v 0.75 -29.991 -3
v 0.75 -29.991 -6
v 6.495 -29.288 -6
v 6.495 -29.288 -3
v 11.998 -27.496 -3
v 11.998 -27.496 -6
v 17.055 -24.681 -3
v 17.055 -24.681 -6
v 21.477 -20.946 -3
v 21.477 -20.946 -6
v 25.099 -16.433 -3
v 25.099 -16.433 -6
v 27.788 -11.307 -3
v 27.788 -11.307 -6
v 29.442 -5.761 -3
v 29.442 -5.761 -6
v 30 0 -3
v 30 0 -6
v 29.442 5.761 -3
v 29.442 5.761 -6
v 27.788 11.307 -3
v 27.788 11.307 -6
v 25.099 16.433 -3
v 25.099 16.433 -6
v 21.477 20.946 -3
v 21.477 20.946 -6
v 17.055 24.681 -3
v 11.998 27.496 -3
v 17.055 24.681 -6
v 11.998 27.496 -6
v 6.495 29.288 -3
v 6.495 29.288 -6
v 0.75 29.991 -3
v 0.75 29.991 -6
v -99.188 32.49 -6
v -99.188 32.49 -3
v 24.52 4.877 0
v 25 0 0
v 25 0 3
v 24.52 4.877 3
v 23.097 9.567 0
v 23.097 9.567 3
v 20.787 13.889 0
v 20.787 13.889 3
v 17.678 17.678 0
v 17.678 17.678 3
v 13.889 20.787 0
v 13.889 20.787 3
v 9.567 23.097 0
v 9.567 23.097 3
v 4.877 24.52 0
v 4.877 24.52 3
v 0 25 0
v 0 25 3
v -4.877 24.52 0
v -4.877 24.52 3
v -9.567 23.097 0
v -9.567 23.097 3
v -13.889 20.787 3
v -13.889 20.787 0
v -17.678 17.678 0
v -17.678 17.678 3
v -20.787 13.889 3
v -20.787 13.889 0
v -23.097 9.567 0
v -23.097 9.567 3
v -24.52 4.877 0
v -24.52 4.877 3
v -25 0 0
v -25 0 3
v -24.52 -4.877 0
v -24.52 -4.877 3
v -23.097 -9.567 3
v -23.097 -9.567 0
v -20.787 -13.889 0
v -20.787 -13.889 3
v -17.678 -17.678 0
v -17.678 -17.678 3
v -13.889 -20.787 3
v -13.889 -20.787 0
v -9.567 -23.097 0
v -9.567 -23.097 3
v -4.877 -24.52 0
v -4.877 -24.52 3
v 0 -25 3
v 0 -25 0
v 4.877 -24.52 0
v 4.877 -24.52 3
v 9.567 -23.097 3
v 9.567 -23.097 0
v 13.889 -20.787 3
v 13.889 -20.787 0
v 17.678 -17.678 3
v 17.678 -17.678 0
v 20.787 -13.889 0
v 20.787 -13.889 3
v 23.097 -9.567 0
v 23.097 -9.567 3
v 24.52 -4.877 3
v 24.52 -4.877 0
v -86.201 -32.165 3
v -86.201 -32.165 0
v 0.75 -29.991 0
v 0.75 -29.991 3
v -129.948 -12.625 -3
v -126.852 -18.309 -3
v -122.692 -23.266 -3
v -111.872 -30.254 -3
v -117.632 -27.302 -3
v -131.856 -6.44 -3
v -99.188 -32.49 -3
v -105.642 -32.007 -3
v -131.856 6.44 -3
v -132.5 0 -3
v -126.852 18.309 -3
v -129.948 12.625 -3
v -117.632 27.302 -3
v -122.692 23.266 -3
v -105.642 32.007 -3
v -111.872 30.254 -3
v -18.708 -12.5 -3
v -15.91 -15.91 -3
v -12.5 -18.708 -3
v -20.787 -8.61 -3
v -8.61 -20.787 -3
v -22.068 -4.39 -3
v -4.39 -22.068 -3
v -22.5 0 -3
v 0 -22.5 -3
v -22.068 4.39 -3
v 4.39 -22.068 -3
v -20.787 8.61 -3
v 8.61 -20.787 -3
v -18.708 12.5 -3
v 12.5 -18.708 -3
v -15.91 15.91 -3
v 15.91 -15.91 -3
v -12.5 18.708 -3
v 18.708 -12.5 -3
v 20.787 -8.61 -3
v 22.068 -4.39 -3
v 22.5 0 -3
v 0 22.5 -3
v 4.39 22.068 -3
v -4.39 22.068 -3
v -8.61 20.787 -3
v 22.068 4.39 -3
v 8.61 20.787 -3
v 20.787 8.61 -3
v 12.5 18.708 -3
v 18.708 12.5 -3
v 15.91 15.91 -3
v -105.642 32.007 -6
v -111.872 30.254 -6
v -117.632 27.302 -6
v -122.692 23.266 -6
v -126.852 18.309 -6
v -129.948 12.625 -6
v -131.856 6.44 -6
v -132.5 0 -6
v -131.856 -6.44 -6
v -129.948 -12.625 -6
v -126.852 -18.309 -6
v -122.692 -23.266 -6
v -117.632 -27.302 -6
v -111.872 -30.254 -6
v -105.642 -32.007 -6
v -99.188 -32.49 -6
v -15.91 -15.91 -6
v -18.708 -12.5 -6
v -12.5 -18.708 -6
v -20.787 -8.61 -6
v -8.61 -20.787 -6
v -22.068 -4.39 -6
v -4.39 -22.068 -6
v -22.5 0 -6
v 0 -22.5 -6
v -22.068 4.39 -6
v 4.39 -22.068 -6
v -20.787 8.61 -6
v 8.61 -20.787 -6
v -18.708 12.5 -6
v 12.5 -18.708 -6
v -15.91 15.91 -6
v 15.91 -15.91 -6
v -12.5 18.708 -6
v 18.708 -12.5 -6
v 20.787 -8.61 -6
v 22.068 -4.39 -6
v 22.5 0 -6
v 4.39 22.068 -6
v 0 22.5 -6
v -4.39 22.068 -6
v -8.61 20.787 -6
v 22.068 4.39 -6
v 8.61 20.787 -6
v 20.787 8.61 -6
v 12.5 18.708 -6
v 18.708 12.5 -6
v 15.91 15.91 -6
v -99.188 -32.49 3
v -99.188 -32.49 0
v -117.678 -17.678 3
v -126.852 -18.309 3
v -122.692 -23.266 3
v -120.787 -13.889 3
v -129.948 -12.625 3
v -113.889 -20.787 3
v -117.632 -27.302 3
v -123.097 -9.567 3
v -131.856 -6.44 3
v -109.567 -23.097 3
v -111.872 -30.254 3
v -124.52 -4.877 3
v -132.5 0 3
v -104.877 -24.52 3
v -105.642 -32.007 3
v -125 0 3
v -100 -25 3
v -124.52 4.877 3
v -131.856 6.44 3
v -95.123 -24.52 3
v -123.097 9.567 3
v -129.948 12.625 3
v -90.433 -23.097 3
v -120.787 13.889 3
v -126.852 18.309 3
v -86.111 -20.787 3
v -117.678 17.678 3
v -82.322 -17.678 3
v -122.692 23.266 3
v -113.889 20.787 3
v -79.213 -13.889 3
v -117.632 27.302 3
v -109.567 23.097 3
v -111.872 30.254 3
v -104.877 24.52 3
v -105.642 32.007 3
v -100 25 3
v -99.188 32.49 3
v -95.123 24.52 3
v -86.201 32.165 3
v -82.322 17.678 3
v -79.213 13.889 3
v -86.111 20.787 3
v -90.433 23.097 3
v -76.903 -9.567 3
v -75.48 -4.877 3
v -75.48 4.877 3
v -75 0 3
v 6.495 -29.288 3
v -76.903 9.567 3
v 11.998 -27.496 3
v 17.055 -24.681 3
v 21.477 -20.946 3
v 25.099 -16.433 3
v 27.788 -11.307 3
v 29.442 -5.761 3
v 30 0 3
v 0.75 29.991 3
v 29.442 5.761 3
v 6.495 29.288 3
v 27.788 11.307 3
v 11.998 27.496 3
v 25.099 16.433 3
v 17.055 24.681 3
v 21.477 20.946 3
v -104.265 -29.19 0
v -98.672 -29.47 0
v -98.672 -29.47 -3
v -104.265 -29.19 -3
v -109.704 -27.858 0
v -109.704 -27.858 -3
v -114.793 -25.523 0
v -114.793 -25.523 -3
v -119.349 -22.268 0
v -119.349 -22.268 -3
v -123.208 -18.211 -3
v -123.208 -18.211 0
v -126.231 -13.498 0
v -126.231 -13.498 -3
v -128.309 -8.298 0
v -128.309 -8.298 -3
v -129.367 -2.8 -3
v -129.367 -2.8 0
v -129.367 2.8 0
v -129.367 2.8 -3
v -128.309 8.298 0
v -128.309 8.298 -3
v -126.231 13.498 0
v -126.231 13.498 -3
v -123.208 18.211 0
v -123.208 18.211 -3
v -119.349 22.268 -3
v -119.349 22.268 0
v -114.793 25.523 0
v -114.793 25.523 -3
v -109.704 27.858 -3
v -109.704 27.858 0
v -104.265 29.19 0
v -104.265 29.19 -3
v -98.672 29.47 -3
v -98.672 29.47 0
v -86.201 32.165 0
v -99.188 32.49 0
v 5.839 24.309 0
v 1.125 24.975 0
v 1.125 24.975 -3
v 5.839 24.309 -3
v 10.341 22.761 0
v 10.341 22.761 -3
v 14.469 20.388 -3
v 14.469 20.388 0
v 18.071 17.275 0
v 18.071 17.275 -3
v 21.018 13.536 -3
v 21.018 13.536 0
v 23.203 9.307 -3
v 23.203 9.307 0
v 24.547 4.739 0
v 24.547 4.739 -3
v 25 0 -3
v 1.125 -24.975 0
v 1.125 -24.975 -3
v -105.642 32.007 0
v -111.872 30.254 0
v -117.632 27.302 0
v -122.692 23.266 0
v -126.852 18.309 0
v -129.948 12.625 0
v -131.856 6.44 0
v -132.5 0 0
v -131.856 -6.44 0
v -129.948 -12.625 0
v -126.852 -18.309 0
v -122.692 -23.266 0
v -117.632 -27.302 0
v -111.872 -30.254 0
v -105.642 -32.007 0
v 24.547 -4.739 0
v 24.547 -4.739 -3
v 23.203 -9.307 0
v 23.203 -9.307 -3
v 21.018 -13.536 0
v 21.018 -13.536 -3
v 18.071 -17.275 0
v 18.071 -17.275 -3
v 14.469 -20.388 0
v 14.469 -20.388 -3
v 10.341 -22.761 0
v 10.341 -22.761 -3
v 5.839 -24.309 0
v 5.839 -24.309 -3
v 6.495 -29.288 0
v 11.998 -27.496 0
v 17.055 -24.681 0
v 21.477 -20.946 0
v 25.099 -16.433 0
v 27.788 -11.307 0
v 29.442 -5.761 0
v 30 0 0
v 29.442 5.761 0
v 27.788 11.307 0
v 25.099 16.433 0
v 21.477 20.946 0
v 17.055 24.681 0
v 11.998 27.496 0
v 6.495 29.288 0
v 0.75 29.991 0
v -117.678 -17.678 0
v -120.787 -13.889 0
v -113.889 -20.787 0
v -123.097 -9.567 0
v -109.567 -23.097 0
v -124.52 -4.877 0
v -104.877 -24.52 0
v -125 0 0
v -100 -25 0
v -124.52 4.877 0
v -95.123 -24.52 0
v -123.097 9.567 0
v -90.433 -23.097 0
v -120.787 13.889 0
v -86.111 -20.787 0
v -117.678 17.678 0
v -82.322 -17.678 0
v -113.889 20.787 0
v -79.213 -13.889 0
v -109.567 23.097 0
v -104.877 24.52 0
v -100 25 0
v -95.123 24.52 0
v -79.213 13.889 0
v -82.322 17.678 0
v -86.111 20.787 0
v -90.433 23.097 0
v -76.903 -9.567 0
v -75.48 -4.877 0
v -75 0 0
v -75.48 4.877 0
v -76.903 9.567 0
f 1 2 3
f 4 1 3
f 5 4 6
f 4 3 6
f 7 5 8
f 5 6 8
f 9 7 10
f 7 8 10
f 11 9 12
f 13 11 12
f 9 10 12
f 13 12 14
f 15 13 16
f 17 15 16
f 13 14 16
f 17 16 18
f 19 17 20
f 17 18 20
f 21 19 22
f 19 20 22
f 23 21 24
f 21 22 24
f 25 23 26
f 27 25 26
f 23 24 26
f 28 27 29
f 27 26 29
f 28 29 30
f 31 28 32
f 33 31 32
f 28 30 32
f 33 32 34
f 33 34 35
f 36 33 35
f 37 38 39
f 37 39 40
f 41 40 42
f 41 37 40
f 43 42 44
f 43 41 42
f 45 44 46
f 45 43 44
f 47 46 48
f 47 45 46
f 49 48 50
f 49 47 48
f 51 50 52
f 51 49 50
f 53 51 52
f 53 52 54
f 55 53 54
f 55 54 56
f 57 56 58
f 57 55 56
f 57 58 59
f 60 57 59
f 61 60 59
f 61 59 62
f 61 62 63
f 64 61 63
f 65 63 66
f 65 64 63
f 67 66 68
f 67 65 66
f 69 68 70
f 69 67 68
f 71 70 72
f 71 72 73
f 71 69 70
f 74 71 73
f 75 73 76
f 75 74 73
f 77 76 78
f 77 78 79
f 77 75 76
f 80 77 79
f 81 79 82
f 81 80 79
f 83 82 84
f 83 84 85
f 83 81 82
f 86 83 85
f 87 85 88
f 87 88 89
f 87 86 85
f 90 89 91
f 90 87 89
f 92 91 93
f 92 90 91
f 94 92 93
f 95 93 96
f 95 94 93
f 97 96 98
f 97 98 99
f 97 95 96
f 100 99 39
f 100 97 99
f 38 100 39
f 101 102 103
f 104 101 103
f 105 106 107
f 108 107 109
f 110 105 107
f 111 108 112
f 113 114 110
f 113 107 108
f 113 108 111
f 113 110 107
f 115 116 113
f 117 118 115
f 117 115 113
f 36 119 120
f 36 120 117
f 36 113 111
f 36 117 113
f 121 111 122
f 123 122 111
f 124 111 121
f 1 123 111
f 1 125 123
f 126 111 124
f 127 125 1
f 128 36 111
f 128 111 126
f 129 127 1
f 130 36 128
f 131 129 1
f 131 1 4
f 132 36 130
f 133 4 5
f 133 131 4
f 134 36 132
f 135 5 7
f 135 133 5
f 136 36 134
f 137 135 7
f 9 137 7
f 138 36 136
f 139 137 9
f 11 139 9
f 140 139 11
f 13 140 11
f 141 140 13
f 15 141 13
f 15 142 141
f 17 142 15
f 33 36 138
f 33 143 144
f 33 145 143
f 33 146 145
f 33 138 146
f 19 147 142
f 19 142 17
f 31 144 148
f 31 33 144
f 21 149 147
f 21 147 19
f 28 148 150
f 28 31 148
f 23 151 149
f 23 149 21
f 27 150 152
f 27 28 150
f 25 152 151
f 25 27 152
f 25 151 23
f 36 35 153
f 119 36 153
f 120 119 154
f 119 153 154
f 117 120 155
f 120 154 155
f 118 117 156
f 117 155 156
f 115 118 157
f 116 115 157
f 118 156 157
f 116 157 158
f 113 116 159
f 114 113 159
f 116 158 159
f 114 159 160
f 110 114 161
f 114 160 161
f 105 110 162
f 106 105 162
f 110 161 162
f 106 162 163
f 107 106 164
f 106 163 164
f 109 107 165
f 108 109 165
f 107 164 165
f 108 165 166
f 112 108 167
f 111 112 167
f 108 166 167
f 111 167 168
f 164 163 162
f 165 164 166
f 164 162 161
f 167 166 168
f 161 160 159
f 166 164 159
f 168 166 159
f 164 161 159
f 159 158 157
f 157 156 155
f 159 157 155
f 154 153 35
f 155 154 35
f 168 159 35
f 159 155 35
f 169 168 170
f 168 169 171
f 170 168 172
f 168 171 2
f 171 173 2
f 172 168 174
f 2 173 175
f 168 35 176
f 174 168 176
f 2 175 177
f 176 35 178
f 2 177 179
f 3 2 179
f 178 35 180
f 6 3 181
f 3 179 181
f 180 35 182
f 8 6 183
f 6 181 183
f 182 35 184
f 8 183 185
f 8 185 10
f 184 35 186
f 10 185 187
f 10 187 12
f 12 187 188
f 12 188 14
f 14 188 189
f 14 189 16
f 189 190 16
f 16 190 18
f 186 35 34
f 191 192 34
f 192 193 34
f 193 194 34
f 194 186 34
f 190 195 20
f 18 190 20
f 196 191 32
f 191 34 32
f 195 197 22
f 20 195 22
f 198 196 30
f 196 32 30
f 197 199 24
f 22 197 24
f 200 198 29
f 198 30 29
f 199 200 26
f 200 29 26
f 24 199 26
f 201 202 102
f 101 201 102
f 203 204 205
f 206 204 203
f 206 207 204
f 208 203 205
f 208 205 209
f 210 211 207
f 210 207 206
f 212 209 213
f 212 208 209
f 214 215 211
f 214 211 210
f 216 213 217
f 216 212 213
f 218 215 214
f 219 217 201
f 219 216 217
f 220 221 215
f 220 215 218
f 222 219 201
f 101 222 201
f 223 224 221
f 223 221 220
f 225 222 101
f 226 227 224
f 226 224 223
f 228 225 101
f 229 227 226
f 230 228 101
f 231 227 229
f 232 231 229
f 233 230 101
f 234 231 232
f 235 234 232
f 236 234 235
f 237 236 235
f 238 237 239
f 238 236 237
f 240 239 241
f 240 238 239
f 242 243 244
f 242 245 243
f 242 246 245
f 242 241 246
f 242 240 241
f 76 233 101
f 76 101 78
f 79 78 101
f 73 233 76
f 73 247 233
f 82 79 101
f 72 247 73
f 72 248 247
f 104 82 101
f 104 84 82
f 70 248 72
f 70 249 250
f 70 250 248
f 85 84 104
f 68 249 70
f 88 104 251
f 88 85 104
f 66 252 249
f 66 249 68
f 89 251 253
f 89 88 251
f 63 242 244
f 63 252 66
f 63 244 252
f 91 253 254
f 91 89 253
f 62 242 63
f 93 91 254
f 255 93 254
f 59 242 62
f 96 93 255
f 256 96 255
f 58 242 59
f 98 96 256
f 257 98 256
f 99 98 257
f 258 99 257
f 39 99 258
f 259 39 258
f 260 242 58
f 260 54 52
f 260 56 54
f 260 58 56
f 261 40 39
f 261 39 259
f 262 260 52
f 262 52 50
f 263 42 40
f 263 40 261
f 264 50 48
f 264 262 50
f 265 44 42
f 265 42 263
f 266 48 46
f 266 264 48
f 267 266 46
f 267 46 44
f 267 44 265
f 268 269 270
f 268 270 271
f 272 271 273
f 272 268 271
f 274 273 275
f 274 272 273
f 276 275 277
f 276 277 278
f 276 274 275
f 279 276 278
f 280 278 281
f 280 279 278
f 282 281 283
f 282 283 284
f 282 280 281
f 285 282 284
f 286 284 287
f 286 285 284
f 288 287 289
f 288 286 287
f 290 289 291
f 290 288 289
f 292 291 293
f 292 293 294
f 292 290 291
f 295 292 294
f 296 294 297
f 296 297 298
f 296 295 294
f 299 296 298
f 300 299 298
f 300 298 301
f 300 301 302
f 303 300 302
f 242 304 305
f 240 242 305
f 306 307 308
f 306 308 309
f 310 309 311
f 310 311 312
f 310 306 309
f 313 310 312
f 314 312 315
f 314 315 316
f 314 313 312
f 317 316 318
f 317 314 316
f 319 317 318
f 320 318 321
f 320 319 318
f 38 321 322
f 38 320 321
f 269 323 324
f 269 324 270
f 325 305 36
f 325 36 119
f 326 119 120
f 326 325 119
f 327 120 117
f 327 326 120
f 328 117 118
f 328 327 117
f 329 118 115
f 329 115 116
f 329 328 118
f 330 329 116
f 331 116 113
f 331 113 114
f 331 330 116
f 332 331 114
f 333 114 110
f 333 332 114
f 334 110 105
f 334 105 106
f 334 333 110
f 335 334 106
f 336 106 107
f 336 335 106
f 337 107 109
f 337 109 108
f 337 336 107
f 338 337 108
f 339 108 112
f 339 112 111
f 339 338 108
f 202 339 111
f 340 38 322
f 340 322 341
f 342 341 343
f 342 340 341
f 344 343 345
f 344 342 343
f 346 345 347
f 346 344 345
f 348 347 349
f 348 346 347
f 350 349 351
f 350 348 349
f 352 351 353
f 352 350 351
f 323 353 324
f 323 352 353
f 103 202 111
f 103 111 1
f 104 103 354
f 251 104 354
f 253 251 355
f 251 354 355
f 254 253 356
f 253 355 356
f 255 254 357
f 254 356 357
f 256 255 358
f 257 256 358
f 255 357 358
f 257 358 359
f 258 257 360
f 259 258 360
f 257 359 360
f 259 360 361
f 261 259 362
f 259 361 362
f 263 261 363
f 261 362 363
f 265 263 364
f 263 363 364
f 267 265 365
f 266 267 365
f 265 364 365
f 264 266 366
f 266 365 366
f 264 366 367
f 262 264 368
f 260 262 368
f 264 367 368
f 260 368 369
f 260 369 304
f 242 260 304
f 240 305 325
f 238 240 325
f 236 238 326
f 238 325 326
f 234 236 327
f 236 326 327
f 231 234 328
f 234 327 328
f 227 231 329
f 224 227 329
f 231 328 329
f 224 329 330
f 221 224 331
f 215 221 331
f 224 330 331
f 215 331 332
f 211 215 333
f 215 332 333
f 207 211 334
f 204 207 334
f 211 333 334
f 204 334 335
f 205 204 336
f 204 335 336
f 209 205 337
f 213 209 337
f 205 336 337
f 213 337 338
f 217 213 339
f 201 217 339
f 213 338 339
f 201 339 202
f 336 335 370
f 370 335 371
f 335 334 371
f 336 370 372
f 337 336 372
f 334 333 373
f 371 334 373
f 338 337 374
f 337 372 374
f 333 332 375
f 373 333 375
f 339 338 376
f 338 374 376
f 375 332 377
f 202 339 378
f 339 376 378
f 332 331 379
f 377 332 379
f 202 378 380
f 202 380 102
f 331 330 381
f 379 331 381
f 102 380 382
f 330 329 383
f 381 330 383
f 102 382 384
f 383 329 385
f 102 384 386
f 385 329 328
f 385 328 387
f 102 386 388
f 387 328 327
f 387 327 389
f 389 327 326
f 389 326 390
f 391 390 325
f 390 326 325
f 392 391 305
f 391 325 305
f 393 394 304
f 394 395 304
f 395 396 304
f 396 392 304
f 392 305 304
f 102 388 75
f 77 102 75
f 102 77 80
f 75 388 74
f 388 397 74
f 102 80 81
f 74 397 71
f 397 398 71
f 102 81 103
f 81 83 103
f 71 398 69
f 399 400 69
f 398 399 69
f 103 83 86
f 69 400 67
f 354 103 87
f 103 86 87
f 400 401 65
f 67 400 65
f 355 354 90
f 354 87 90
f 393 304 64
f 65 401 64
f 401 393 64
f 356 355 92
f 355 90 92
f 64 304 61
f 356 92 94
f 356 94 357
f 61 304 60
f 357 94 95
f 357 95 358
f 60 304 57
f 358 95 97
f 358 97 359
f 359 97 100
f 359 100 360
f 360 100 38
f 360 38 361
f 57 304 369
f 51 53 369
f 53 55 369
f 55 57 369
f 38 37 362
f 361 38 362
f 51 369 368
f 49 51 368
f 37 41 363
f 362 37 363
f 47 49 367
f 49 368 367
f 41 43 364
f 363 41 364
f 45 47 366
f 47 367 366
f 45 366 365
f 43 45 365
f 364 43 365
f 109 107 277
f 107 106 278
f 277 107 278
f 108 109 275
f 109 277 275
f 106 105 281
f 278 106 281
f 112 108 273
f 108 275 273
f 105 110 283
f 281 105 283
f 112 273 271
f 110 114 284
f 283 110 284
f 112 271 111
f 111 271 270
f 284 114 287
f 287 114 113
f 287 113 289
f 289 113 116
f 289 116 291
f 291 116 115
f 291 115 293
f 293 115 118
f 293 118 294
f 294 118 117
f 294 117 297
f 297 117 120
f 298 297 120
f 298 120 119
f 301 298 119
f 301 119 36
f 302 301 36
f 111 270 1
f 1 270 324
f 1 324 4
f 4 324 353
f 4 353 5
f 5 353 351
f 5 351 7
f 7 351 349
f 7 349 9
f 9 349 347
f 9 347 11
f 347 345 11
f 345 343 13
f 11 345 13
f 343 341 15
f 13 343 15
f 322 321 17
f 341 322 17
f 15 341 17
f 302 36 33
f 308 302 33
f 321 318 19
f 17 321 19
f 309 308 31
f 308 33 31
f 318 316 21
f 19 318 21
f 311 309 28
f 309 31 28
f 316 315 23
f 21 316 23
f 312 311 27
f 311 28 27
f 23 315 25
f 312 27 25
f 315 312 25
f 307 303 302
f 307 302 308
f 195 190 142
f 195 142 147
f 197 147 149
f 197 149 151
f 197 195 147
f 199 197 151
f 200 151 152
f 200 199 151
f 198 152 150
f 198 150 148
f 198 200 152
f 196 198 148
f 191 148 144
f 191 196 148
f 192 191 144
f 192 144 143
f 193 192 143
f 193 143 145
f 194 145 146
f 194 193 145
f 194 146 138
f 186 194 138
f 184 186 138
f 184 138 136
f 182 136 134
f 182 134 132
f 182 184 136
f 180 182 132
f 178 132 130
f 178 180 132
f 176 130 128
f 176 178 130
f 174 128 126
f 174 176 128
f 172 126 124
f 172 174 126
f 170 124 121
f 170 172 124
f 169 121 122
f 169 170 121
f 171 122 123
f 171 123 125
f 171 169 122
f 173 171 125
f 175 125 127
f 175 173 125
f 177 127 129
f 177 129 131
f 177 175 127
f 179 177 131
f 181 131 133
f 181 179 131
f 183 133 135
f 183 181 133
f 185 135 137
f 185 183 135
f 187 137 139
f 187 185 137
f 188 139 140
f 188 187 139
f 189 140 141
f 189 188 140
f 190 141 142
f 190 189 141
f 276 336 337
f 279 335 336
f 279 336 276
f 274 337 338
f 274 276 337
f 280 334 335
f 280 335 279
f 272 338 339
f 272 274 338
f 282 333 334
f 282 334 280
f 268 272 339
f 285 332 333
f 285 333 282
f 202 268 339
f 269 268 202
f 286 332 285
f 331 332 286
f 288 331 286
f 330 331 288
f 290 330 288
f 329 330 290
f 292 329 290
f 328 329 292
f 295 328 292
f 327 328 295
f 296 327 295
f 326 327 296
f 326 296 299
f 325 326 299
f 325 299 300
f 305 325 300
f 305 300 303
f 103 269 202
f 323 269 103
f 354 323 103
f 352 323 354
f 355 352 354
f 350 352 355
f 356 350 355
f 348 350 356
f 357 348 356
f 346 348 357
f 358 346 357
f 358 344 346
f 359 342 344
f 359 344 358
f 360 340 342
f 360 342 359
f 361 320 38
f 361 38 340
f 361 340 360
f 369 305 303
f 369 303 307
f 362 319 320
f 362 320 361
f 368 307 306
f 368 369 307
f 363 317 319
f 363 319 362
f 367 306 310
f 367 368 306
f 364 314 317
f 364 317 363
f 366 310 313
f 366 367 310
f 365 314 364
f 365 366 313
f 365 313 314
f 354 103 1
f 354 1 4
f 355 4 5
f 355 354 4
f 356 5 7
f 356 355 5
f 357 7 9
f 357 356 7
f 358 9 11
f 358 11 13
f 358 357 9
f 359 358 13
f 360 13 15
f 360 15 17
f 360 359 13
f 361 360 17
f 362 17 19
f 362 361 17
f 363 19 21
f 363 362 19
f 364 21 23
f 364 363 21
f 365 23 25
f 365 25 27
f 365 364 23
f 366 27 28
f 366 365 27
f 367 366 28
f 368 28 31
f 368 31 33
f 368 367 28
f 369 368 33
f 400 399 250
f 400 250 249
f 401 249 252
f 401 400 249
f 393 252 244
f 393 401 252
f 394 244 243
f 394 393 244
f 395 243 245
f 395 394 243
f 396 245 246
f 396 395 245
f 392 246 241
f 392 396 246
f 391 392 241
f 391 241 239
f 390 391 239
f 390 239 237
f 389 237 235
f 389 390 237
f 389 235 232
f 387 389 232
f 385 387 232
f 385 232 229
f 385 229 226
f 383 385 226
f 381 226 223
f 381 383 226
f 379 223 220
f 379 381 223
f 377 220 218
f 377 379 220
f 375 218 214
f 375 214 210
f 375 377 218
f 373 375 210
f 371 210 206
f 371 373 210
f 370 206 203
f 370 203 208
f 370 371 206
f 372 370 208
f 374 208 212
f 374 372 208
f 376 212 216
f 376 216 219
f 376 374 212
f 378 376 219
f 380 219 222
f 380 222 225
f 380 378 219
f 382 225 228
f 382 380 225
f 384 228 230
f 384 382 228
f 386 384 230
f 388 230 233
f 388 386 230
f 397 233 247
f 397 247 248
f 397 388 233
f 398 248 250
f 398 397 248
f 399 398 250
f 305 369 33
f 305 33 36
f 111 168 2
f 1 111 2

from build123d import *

# Parameters (mm, degrees)
F1_R     = 25
F5_DEPTH = 3
F6_DEPTH = 3
F4_R     = 22.5
F7_DEPTH = 3


with BuildPart() as f5:
    # F1 (on Top) → F5 (new body)
    with BuildSketch(Plane.XY):
        with BuildLine():
            Line((0.75, 29.9906235347), (-86.2011790718, 32.1650826362))
            Line((-86.2011790718, 32.1650826362), (-99.1875, 32.4898421626))
            ThreePointArc((-99.1875, 32.4898421626), (-132.5, 0), (-99.1875, -32.4898421626))
            Line((-99.1875, -32.4898421626), (-86.2011790718, -32.1650826362))
            Line((-86.2011790718, -32.1650826362), (0.75, -29.9906235347))
            ThreePointArc((0.75, -29.9906235347), (30, 0), (0.75, 29.9906235347))
        make_face()
        with Locations((-100, 0)):
            Circle(F1_R, mode=Mode.SUBTRACT)
        Circle(F1_R, mode=Mode.SUBTRACT)
    extrude(amount=F5_DEPTH)


with BuildPart() as f6:
    # F2 (on Top) → F6 (new body)
    with BuildSketch(Plane.XY):
        with BuildLine():
            Line((0.75, 29.9906235347), (-99.1875, 32.4898421626))
            ThreePointArc((-99.1875, 32.4898421626), (-132.5, 0), (-99.1875, -32.4898421626))
            Line((-99.1875, -32.4898421626), (0.75, -29.9906235347))
            ThreePointArc((0.75, -29.9906235347), (30, 0), (0.75, 29.9906235347))
        make_face()
        with BuildLine():
            ThreePointArc((-98.6725, -29.4701161136), (-129.5, 0), (-98.6725, 29.4701161136))
            Line((-98.6725, 29.4701161136), (1.125, 24.9746746726))
            ThreePointArc((1.125, 24.9746746726), (18.0710403685, 17.2753437014), (25, 0))
            ThreePointArc((25, 0), (18.0710403685, -17.2753437014), (1.125, -24.9746746726))
            Line((1.125, -24.9746746726), (-98.6725, -29.4701161136))
        make_face(mode=Mode.SUBTRACT)
    extrude(amount=-F6_DEPTH)


with BuildPart() as f7:
    # F4 (on offset) → F7 (new body)
    with BuildSketch(Plane.XY.offset(-6)):
        with BuildLine():
            Line((0.75, 29.9906235347), (-99.1875, 32.4898421626))
            ThreePointArc((-99.1875, 32.4898421626), (-132.5, 0), (-99.1875, -32.4898421626))
            Line((-99.1875, -32.4898421626), (0.75, -29.9906235347))
            ThreePointArc((0.75, -29.9906235347), (30, 0), (0.75, 29.9906235347))
        make_face()
        Circle(F4_R, mode=Mode.SUBTRACT)
    extrude(amount=F7_DEPTH)


solid = Compound([f5.part, f6.part, f7.part])
